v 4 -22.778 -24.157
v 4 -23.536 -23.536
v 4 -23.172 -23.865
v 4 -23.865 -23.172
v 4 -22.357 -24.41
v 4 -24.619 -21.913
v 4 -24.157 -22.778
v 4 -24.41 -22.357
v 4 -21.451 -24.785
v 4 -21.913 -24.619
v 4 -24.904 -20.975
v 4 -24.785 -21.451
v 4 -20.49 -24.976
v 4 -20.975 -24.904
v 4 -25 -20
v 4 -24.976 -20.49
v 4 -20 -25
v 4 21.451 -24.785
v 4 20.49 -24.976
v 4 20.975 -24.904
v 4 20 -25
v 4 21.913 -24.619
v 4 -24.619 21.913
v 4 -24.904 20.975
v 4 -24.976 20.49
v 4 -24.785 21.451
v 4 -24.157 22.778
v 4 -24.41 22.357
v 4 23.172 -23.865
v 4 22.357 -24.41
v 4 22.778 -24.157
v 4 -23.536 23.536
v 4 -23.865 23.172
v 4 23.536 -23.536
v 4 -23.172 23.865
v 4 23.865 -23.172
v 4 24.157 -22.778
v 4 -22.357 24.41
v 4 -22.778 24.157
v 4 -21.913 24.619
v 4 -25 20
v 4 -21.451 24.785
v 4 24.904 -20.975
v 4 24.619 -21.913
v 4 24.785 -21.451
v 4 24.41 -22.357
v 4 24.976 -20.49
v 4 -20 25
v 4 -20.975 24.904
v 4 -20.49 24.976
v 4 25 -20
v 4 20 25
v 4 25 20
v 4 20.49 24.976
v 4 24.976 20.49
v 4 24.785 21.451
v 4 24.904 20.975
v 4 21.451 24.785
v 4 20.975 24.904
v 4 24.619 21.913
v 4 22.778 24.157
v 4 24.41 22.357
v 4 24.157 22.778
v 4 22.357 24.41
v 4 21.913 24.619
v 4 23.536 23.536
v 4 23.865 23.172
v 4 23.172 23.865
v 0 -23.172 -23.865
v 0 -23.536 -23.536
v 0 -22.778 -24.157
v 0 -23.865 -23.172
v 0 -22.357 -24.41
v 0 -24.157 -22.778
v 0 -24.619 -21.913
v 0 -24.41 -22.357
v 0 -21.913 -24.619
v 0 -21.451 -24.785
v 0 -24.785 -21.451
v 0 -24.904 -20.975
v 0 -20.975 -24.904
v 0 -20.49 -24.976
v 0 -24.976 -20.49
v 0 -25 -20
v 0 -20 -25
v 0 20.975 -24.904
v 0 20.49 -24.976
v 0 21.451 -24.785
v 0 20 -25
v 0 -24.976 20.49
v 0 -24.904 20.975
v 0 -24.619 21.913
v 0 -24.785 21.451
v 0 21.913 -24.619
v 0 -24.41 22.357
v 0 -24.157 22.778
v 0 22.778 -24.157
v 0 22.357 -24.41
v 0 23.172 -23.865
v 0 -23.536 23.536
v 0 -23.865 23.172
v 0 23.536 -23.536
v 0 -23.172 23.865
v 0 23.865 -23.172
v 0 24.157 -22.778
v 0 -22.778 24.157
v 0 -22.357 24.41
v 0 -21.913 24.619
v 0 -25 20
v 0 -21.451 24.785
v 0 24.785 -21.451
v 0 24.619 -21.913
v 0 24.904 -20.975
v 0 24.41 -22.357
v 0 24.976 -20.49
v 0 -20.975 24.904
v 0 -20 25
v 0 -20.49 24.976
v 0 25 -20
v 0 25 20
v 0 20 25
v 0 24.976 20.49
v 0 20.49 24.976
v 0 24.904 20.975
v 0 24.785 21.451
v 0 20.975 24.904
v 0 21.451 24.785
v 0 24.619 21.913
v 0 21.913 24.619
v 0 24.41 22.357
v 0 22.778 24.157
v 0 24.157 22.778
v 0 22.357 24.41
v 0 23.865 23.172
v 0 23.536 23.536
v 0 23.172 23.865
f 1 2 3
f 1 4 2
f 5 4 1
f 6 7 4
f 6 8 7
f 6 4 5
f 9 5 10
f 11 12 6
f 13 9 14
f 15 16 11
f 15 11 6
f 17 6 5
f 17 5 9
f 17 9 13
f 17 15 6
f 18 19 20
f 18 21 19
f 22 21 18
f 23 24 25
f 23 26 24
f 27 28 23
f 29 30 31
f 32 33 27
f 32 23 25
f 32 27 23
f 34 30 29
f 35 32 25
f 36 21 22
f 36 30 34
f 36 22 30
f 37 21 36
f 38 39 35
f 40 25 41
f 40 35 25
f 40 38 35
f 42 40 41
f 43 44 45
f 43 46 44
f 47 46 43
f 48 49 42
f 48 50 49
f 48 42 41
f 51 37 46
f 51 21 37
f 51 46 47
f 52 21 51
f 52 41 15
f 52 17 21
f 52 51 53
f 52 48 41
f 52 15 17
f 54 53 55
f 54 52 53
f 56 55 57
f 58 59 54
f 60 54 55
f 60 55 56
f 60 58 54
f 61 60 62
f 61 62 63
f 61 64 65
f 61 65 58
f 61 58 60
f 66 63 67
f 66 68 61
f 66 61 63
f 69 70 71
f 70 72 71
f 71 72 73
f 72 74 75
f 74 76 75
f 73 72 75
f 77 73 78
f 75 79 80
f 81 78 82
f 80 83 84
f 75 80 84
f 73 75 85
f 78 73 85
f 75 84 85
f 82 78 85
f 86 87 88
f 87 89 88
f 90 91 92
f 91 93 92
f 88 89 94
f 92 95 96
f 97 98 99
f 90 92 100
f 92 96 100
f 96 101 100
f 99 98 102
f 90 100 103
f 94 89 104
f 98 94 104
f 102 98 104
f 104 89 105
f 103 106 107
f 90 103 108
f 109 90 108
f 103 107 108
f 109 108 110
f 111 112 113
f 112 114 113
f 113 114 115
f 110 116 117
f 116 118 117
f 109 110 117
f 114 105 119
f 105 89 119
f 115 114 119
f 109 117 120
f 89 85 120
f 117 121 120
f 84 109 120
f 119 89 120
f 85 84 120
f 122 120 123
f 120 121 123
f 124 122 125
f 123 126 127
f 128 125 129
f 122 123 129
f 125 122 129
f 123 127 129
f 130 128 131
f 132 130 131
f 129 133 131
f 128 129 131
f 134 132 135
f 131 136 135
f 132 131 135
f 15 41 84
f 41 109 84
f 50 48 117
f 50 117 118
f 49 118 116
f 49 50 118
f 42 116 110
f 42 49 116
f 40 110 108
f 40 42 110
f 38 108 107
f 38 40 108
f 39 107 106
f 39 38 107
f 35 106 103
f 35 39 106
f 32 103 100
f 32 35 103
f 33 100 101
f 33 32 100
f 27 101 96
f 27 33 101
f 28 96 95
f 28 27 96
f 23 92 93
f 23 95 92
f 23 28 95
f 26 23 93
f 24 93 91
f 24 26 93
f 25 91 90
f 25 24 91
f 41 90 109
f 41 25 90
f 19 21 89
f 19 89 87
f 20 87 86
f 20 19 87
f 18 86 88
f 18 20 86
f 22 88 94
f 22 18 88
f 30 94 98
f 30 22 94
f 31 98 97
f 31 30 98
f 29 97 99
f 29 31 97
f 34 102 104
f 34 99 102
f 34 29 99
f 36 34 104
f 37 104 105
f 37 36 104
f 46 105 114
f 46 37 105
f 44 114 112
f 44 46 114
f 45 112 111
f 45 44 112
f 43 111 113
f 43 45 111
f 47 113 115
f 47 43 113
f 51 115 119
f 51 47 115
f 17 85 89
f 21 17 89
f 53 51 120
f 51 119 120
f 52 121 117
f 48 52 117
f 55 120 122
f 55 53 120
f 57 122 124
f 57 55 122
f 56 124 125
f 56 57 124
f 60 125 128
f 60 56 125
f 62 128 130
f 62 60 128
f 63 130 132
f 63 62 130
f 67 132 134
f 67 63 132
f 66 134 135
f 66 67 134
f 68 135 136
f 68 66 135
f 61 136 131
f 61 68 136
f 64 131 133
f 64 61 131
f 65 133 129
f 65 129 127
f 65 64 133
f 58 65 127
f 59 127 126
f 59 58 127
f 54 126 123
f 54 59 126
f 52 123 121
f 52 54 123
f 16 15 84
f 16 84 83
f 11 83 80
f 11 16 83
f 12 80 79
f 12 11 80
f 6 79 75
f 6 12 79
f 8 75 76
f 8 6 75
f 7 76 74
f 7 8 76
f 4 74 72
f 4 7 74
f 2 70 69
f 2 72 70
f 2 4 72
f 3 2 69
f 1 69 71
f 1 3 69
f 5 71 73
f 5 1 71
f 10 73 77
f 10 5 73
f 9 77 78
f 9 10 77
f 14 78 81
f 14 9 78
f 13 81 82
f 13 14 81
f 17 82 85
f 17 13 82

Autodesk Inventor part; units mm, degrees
ref_plane "YZ Plane" through (0, 0, 0) normal (1, 0, 0) x (0, 1, 0)
ref_plane "XZ Plane" through (0, 0, 0) normal (0, 1, 0) x (-1, 0, 0)
ref_plane "XY Plane" through (0, 0, 0) normal (0, 0, 1) x (1, 0, 0)
sketch "Эскиз1" plane through (0, 0, 0) normal (1, 0, 0) x (0, 1, 0)
  line L0 (25, 25) -> (-25, 25)
  line L1 (-25, 25) -> (-25, -25)
  line L2 (-25, -25) -> (25, -25)
  line L3 (25, -25) -> (25, 25)
  line L4 (25, 25) -> (-25, -25) construction
  point P0 (0, 0)
  point P1 (0, 0)
  dimension "d0" = 50
  dimension "d1" = 50
extrude "Выдавливание1" add sketch "Эскиз1" along normal blind 4
fillet "Сопряжение1" radius 5 4 edges at (2, 25, 25) (2, -25, 25) (2, 25, -25) (2, -25, -25)
properties part number "крепление руки"
